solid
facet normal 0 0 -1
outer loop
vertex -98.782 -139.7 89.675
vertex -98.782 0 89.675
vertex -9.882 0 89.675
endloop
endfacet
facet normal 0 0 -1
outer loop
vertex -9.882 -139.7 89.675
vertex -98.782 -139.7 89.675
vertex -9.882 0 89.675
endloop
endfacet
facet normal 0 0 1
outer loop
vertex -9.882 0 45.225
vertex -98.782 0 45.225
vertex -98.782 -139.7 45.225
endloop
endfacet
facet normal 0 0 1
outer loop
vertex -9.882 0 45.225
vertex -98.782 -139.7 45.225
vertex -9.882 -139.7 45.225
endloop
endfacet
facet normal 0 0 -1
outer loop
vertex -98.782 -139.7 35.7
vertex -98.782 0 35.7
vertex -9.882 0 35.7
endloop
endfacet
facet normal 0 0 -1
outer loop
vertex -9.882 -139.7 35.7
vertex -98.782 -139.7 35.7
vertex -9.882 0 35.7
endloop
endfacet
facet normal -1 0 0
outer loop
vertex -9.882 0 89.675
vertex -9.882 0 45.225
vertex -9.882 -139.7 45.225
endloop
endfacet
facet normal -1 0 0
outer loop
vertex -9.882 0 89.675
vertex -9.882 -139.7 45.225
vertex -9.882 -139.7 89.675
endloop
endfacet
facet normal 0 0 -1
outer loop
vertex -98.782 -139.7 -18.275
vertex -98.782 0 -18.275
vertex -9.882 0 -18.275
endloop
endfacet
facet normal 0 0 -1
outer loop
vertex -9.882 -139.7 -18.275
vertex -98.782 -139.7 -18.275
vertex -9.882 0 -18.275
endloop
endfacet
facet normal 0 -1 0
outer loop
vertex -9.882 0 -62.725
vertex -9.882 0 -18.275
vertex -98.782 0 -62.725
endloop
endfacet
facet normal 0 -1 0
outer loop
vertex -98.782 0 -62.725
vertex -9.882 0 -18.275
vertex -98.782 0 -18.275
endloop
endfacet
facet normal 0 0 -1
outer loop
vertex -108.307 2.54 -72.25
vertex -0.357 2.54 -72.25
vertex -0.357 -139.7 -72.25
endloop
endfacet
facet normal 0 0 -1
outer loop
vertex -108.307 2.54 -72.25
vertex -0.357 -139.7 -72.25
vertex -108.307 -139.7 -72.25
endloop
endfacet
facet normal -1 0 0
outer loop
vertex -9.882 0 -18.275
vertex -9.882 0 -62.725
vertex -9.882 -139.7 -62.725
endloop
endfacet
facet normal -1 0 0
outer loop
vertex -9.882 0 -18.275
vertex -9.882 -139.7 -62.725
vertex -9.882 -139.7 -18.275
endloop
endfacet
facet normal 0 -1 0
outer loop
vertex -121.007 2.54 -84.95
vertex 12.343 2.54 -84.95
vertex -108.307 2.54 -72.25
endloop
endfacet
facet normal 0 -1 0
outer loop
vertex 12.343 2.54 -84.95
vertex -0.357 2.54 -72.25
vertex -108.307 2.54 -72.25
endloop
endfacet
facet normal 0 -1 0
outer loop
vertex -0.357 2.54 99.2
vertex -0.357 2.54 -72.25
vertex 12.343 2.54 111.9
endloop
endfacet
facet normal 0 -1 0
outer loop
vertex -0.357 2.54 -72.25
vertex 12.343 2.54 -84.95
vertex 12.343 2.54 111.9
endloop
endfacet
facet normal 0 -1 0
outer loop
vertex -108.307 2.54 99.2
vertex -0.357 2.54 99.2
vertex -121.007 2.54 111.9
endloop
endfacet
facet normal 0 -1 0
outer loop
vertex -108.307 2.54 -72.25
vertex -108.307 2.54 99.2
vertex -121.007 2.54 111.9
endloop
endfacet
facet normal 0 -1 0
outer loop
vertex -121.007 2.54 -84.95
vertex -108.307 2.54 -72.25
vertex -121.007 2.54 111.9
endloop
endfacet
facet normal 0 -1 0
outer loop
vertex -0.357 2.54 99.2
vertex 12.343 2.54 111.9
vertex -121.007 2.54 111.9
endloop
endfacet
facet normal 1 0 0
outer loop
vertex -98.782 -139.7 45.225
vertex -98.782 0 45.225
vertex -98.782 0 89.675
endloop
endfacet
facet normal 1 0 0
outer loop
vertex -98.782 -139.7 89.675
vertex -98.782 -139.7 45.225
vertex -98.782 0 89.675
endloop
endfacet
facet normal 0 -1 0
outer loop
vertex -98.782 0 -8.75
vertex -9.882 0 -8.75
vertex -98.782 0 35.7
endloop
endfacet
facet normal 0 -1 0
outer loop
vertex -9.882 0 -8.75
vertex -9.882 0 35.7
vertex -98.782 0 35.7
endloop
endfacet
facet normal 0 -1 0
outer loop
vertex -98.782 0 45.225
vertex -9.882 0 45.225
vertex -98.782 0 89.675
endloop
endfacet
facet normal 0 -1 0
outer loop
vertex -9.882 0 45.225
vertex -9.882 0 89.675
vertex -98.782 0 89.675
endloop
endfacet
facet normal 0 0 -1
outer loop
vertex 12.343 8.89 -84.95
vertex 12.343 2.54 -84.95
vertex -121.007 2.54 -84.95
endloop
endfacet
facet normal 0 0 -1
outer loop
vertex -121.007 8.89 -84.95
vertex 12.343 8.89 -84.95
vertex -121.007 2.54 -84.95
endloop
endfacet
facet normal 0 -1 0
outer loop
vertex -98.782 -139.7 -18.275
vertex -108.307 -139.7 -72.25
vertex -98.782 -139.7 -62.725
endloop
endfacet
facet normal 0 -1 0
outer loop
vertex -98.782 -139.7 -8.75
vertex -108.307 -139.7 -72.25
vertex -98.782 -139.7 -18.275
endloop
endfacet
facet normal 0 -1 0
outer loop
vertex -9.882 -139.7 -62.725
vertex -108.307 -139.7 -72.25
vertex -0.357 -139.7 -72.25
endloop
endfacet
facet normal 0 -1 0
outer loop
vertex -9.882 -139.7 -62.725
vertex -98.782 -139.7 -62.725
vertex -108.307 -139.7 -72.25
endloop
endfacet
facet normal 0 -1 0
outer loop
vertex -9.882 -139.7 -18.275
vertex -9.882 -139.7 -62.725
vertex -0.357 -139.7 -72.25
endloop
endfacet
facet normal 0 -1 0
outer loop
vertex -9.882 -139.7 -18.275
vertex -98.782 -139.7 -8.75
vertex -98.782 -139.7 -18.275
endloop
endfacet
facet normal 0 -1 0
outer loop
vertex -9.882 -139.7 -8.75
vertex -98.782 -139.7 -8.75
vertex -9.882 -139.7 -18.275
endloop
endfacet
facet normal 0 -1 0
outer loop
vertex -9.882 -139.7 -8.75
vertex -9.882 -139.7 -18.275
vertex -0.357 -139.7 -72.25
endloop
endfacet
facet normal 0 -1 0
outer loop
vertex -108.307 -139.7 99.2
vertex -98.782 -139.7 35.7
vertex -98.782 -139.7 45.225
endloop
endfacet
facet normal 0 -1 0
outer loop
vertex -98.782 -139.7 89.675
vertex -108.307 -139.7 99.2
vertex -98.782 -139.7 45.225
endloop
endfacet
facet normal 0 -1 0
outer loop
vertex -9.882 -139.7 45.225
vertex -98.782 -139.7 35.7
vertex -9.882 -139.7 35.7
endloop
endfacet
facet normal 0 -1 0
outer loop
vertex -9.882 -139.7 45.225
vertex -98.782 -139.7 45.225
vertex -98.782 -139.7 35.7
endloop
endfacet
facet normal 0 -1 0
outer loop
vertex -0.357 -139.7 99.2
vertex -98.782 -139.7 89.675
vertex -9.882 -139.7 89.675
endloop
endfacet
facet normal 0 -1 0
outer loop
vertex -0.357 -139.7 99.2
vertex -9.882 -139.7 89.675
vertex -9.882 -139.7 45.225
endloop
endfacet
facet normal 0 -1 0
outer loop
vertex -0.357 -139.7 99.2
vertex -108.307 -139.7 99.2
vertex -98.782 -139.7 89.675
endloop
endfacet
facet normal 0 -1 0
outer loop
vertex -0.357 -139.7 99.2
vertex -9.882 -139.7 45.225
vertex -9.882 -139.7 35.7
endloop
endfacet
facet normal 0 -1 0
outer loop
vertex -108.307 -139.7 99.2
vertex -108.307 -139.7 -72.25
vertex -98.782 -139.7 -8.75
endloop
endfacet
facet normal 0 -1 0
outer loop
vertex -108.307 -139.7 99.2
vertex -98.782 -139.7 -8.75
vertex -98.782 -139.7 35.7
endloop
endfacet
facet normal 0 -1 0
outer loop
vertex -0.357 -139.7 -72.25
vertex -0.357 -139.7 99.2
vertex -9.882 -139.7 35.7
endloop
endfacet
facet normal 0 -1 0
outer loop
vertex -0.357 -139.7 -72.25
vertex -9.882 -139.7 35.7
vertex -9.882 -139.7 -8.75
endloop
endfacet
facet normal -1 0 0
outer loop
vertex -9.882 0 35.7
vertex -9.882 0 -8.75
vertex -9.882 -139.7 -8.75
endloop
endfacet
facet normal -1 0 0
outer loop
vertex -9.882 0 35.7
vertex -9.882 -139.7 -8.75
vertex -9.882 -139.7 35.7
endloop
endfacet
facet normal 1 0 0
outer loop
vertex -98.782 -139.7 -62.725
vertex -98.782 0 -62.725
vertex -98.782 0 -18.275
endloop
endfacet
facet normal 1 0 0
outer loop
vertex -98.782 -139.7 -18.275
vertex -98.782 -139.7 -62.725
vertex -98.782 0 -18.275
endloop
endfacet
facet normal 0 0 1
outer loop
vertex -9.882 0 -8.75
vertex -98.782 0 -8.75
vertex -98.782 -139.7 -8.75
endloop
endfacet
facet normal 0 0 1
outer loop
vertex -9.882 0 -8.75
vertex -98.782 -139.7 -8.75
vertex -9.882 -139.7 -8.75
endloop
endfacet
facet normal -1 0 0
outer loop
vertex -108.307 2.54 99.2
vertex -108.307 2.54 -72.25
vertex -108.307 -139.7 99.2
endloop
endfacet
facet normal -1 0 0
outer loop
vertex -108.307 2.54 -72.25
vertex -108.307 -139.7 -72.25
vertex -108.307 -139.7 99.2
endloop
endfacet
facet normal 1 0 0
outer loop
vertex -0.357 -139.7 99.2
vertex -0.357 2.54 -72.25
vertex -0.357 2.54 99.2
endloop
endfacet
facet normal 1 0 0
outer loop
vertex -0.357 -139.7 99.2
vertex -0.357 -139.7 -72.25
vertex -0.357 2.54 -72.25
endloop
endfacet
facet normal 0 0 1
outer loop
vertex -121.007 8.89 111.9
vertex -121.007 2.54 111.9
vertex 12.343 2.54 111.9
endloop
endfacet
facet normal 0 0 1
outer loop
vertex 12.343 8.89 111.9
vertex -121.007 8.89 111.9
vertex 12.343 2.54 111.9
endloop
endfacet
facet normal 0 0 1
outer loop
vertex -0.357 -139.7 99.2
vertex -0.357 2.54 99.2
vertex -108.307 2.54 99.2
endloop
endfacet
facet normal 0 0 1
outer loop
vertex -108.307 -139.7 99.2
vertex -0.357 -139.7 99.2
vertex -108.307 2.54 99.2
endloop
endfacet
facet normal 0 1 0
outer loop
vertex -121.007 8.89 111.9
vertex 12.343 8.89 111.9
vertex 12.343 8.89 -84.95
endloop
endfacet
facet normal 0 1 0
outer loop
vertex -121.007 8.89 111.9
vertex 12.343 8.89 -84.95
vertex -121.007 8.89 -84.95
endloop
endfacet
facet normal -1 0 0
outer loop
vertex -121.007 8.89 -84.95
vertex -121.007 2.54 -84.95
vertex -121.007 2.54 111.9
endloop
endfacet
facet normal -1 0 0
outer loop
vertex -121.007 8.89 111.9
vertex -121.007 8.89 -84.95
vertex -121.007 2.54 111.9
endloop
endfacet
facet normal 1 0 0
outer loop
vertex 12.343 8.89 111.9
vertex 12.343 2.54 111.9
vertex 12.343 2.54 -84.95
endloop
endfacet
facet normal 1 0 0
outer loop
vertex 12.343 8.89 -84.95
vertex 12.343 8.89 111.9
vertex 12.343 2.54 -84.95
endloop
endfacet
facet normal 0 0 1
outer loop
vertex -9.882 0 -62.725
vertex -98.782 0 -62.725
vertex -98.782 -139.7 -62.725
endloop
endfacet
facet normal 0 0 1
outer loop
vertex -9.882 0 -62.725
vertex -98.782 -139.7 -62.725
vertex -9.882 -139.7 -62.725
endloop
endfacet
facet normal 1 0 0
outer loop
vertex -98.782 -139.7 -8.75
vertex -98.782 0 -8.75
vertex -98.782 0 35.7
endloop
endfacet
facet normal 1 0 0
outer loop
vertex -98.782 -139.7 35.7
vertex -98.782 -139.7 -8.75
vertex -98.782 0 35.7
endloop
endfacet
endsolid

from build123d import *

# Parameters (mm, degrees)
F0_W     = 107.95
F0_H     = 171.45
F0_W_2   = 88.9
F0_H_2   = 44.45
F1_DEPTH = 139.7
F2_W     = 107.95
F2_H     = 171.45
F3_DEPTH = 2.54
F5_DEPTH = 6.35


with BuildPart() as f1:
    # F0 (on Front) → F1 (new body)
    with BuildSketch(Plane.XZ):
        with Locations((-54.33191, 13.475312)):
            Rectangle(F0_W, F0_H)
        with Locations((-54.33191, -40.499688)):
            Rectangle(F0_W_2, F0_H_2, mode=Mode.SUBTRACT)
        with Locations((-54.33191, 67.450312)):
            Rectangle(F0_W_2, F0_H_2, mode=Mode.SUBTRACT)
        with Locations((-54.33191, 13.475312)):
            Rectangle(F0_W_2, F0_H_2, mode=Mode.SUBTRACT)
    extrude(amount=F1_DEPTH)

    # F2 (on face) → F3 (join)
    with BuildSketch(Plane(origin=(0, 0, 0), x_dir=(-1, 0, 0), z_dir=(0, 1, 0))):
        with Locations((54.33191, 13.475312)):
            Rectangle(F2_W, F2_H)
    extrude(amount=F3_DEPTH)

    # F4 (on face) → F5 (join)
    with BuildSketch(Plane(origin=(0, 2.54, 0), x_dir=(-1, 0, 0), z_dir=(0, 1, 0))):
        Polygon((121.00691, 111.900312), (0.35691, 111.900312), (-12.34309, 111.900312), (-12.34309, 99.200312), (-12.34309, -84.949688), (108.30691, -84.949688), (121.00691, -84.949688), (121.00691, -72.249688), align=None)
    extrude(amount=F5_DEPTH)


solid = f1.part
